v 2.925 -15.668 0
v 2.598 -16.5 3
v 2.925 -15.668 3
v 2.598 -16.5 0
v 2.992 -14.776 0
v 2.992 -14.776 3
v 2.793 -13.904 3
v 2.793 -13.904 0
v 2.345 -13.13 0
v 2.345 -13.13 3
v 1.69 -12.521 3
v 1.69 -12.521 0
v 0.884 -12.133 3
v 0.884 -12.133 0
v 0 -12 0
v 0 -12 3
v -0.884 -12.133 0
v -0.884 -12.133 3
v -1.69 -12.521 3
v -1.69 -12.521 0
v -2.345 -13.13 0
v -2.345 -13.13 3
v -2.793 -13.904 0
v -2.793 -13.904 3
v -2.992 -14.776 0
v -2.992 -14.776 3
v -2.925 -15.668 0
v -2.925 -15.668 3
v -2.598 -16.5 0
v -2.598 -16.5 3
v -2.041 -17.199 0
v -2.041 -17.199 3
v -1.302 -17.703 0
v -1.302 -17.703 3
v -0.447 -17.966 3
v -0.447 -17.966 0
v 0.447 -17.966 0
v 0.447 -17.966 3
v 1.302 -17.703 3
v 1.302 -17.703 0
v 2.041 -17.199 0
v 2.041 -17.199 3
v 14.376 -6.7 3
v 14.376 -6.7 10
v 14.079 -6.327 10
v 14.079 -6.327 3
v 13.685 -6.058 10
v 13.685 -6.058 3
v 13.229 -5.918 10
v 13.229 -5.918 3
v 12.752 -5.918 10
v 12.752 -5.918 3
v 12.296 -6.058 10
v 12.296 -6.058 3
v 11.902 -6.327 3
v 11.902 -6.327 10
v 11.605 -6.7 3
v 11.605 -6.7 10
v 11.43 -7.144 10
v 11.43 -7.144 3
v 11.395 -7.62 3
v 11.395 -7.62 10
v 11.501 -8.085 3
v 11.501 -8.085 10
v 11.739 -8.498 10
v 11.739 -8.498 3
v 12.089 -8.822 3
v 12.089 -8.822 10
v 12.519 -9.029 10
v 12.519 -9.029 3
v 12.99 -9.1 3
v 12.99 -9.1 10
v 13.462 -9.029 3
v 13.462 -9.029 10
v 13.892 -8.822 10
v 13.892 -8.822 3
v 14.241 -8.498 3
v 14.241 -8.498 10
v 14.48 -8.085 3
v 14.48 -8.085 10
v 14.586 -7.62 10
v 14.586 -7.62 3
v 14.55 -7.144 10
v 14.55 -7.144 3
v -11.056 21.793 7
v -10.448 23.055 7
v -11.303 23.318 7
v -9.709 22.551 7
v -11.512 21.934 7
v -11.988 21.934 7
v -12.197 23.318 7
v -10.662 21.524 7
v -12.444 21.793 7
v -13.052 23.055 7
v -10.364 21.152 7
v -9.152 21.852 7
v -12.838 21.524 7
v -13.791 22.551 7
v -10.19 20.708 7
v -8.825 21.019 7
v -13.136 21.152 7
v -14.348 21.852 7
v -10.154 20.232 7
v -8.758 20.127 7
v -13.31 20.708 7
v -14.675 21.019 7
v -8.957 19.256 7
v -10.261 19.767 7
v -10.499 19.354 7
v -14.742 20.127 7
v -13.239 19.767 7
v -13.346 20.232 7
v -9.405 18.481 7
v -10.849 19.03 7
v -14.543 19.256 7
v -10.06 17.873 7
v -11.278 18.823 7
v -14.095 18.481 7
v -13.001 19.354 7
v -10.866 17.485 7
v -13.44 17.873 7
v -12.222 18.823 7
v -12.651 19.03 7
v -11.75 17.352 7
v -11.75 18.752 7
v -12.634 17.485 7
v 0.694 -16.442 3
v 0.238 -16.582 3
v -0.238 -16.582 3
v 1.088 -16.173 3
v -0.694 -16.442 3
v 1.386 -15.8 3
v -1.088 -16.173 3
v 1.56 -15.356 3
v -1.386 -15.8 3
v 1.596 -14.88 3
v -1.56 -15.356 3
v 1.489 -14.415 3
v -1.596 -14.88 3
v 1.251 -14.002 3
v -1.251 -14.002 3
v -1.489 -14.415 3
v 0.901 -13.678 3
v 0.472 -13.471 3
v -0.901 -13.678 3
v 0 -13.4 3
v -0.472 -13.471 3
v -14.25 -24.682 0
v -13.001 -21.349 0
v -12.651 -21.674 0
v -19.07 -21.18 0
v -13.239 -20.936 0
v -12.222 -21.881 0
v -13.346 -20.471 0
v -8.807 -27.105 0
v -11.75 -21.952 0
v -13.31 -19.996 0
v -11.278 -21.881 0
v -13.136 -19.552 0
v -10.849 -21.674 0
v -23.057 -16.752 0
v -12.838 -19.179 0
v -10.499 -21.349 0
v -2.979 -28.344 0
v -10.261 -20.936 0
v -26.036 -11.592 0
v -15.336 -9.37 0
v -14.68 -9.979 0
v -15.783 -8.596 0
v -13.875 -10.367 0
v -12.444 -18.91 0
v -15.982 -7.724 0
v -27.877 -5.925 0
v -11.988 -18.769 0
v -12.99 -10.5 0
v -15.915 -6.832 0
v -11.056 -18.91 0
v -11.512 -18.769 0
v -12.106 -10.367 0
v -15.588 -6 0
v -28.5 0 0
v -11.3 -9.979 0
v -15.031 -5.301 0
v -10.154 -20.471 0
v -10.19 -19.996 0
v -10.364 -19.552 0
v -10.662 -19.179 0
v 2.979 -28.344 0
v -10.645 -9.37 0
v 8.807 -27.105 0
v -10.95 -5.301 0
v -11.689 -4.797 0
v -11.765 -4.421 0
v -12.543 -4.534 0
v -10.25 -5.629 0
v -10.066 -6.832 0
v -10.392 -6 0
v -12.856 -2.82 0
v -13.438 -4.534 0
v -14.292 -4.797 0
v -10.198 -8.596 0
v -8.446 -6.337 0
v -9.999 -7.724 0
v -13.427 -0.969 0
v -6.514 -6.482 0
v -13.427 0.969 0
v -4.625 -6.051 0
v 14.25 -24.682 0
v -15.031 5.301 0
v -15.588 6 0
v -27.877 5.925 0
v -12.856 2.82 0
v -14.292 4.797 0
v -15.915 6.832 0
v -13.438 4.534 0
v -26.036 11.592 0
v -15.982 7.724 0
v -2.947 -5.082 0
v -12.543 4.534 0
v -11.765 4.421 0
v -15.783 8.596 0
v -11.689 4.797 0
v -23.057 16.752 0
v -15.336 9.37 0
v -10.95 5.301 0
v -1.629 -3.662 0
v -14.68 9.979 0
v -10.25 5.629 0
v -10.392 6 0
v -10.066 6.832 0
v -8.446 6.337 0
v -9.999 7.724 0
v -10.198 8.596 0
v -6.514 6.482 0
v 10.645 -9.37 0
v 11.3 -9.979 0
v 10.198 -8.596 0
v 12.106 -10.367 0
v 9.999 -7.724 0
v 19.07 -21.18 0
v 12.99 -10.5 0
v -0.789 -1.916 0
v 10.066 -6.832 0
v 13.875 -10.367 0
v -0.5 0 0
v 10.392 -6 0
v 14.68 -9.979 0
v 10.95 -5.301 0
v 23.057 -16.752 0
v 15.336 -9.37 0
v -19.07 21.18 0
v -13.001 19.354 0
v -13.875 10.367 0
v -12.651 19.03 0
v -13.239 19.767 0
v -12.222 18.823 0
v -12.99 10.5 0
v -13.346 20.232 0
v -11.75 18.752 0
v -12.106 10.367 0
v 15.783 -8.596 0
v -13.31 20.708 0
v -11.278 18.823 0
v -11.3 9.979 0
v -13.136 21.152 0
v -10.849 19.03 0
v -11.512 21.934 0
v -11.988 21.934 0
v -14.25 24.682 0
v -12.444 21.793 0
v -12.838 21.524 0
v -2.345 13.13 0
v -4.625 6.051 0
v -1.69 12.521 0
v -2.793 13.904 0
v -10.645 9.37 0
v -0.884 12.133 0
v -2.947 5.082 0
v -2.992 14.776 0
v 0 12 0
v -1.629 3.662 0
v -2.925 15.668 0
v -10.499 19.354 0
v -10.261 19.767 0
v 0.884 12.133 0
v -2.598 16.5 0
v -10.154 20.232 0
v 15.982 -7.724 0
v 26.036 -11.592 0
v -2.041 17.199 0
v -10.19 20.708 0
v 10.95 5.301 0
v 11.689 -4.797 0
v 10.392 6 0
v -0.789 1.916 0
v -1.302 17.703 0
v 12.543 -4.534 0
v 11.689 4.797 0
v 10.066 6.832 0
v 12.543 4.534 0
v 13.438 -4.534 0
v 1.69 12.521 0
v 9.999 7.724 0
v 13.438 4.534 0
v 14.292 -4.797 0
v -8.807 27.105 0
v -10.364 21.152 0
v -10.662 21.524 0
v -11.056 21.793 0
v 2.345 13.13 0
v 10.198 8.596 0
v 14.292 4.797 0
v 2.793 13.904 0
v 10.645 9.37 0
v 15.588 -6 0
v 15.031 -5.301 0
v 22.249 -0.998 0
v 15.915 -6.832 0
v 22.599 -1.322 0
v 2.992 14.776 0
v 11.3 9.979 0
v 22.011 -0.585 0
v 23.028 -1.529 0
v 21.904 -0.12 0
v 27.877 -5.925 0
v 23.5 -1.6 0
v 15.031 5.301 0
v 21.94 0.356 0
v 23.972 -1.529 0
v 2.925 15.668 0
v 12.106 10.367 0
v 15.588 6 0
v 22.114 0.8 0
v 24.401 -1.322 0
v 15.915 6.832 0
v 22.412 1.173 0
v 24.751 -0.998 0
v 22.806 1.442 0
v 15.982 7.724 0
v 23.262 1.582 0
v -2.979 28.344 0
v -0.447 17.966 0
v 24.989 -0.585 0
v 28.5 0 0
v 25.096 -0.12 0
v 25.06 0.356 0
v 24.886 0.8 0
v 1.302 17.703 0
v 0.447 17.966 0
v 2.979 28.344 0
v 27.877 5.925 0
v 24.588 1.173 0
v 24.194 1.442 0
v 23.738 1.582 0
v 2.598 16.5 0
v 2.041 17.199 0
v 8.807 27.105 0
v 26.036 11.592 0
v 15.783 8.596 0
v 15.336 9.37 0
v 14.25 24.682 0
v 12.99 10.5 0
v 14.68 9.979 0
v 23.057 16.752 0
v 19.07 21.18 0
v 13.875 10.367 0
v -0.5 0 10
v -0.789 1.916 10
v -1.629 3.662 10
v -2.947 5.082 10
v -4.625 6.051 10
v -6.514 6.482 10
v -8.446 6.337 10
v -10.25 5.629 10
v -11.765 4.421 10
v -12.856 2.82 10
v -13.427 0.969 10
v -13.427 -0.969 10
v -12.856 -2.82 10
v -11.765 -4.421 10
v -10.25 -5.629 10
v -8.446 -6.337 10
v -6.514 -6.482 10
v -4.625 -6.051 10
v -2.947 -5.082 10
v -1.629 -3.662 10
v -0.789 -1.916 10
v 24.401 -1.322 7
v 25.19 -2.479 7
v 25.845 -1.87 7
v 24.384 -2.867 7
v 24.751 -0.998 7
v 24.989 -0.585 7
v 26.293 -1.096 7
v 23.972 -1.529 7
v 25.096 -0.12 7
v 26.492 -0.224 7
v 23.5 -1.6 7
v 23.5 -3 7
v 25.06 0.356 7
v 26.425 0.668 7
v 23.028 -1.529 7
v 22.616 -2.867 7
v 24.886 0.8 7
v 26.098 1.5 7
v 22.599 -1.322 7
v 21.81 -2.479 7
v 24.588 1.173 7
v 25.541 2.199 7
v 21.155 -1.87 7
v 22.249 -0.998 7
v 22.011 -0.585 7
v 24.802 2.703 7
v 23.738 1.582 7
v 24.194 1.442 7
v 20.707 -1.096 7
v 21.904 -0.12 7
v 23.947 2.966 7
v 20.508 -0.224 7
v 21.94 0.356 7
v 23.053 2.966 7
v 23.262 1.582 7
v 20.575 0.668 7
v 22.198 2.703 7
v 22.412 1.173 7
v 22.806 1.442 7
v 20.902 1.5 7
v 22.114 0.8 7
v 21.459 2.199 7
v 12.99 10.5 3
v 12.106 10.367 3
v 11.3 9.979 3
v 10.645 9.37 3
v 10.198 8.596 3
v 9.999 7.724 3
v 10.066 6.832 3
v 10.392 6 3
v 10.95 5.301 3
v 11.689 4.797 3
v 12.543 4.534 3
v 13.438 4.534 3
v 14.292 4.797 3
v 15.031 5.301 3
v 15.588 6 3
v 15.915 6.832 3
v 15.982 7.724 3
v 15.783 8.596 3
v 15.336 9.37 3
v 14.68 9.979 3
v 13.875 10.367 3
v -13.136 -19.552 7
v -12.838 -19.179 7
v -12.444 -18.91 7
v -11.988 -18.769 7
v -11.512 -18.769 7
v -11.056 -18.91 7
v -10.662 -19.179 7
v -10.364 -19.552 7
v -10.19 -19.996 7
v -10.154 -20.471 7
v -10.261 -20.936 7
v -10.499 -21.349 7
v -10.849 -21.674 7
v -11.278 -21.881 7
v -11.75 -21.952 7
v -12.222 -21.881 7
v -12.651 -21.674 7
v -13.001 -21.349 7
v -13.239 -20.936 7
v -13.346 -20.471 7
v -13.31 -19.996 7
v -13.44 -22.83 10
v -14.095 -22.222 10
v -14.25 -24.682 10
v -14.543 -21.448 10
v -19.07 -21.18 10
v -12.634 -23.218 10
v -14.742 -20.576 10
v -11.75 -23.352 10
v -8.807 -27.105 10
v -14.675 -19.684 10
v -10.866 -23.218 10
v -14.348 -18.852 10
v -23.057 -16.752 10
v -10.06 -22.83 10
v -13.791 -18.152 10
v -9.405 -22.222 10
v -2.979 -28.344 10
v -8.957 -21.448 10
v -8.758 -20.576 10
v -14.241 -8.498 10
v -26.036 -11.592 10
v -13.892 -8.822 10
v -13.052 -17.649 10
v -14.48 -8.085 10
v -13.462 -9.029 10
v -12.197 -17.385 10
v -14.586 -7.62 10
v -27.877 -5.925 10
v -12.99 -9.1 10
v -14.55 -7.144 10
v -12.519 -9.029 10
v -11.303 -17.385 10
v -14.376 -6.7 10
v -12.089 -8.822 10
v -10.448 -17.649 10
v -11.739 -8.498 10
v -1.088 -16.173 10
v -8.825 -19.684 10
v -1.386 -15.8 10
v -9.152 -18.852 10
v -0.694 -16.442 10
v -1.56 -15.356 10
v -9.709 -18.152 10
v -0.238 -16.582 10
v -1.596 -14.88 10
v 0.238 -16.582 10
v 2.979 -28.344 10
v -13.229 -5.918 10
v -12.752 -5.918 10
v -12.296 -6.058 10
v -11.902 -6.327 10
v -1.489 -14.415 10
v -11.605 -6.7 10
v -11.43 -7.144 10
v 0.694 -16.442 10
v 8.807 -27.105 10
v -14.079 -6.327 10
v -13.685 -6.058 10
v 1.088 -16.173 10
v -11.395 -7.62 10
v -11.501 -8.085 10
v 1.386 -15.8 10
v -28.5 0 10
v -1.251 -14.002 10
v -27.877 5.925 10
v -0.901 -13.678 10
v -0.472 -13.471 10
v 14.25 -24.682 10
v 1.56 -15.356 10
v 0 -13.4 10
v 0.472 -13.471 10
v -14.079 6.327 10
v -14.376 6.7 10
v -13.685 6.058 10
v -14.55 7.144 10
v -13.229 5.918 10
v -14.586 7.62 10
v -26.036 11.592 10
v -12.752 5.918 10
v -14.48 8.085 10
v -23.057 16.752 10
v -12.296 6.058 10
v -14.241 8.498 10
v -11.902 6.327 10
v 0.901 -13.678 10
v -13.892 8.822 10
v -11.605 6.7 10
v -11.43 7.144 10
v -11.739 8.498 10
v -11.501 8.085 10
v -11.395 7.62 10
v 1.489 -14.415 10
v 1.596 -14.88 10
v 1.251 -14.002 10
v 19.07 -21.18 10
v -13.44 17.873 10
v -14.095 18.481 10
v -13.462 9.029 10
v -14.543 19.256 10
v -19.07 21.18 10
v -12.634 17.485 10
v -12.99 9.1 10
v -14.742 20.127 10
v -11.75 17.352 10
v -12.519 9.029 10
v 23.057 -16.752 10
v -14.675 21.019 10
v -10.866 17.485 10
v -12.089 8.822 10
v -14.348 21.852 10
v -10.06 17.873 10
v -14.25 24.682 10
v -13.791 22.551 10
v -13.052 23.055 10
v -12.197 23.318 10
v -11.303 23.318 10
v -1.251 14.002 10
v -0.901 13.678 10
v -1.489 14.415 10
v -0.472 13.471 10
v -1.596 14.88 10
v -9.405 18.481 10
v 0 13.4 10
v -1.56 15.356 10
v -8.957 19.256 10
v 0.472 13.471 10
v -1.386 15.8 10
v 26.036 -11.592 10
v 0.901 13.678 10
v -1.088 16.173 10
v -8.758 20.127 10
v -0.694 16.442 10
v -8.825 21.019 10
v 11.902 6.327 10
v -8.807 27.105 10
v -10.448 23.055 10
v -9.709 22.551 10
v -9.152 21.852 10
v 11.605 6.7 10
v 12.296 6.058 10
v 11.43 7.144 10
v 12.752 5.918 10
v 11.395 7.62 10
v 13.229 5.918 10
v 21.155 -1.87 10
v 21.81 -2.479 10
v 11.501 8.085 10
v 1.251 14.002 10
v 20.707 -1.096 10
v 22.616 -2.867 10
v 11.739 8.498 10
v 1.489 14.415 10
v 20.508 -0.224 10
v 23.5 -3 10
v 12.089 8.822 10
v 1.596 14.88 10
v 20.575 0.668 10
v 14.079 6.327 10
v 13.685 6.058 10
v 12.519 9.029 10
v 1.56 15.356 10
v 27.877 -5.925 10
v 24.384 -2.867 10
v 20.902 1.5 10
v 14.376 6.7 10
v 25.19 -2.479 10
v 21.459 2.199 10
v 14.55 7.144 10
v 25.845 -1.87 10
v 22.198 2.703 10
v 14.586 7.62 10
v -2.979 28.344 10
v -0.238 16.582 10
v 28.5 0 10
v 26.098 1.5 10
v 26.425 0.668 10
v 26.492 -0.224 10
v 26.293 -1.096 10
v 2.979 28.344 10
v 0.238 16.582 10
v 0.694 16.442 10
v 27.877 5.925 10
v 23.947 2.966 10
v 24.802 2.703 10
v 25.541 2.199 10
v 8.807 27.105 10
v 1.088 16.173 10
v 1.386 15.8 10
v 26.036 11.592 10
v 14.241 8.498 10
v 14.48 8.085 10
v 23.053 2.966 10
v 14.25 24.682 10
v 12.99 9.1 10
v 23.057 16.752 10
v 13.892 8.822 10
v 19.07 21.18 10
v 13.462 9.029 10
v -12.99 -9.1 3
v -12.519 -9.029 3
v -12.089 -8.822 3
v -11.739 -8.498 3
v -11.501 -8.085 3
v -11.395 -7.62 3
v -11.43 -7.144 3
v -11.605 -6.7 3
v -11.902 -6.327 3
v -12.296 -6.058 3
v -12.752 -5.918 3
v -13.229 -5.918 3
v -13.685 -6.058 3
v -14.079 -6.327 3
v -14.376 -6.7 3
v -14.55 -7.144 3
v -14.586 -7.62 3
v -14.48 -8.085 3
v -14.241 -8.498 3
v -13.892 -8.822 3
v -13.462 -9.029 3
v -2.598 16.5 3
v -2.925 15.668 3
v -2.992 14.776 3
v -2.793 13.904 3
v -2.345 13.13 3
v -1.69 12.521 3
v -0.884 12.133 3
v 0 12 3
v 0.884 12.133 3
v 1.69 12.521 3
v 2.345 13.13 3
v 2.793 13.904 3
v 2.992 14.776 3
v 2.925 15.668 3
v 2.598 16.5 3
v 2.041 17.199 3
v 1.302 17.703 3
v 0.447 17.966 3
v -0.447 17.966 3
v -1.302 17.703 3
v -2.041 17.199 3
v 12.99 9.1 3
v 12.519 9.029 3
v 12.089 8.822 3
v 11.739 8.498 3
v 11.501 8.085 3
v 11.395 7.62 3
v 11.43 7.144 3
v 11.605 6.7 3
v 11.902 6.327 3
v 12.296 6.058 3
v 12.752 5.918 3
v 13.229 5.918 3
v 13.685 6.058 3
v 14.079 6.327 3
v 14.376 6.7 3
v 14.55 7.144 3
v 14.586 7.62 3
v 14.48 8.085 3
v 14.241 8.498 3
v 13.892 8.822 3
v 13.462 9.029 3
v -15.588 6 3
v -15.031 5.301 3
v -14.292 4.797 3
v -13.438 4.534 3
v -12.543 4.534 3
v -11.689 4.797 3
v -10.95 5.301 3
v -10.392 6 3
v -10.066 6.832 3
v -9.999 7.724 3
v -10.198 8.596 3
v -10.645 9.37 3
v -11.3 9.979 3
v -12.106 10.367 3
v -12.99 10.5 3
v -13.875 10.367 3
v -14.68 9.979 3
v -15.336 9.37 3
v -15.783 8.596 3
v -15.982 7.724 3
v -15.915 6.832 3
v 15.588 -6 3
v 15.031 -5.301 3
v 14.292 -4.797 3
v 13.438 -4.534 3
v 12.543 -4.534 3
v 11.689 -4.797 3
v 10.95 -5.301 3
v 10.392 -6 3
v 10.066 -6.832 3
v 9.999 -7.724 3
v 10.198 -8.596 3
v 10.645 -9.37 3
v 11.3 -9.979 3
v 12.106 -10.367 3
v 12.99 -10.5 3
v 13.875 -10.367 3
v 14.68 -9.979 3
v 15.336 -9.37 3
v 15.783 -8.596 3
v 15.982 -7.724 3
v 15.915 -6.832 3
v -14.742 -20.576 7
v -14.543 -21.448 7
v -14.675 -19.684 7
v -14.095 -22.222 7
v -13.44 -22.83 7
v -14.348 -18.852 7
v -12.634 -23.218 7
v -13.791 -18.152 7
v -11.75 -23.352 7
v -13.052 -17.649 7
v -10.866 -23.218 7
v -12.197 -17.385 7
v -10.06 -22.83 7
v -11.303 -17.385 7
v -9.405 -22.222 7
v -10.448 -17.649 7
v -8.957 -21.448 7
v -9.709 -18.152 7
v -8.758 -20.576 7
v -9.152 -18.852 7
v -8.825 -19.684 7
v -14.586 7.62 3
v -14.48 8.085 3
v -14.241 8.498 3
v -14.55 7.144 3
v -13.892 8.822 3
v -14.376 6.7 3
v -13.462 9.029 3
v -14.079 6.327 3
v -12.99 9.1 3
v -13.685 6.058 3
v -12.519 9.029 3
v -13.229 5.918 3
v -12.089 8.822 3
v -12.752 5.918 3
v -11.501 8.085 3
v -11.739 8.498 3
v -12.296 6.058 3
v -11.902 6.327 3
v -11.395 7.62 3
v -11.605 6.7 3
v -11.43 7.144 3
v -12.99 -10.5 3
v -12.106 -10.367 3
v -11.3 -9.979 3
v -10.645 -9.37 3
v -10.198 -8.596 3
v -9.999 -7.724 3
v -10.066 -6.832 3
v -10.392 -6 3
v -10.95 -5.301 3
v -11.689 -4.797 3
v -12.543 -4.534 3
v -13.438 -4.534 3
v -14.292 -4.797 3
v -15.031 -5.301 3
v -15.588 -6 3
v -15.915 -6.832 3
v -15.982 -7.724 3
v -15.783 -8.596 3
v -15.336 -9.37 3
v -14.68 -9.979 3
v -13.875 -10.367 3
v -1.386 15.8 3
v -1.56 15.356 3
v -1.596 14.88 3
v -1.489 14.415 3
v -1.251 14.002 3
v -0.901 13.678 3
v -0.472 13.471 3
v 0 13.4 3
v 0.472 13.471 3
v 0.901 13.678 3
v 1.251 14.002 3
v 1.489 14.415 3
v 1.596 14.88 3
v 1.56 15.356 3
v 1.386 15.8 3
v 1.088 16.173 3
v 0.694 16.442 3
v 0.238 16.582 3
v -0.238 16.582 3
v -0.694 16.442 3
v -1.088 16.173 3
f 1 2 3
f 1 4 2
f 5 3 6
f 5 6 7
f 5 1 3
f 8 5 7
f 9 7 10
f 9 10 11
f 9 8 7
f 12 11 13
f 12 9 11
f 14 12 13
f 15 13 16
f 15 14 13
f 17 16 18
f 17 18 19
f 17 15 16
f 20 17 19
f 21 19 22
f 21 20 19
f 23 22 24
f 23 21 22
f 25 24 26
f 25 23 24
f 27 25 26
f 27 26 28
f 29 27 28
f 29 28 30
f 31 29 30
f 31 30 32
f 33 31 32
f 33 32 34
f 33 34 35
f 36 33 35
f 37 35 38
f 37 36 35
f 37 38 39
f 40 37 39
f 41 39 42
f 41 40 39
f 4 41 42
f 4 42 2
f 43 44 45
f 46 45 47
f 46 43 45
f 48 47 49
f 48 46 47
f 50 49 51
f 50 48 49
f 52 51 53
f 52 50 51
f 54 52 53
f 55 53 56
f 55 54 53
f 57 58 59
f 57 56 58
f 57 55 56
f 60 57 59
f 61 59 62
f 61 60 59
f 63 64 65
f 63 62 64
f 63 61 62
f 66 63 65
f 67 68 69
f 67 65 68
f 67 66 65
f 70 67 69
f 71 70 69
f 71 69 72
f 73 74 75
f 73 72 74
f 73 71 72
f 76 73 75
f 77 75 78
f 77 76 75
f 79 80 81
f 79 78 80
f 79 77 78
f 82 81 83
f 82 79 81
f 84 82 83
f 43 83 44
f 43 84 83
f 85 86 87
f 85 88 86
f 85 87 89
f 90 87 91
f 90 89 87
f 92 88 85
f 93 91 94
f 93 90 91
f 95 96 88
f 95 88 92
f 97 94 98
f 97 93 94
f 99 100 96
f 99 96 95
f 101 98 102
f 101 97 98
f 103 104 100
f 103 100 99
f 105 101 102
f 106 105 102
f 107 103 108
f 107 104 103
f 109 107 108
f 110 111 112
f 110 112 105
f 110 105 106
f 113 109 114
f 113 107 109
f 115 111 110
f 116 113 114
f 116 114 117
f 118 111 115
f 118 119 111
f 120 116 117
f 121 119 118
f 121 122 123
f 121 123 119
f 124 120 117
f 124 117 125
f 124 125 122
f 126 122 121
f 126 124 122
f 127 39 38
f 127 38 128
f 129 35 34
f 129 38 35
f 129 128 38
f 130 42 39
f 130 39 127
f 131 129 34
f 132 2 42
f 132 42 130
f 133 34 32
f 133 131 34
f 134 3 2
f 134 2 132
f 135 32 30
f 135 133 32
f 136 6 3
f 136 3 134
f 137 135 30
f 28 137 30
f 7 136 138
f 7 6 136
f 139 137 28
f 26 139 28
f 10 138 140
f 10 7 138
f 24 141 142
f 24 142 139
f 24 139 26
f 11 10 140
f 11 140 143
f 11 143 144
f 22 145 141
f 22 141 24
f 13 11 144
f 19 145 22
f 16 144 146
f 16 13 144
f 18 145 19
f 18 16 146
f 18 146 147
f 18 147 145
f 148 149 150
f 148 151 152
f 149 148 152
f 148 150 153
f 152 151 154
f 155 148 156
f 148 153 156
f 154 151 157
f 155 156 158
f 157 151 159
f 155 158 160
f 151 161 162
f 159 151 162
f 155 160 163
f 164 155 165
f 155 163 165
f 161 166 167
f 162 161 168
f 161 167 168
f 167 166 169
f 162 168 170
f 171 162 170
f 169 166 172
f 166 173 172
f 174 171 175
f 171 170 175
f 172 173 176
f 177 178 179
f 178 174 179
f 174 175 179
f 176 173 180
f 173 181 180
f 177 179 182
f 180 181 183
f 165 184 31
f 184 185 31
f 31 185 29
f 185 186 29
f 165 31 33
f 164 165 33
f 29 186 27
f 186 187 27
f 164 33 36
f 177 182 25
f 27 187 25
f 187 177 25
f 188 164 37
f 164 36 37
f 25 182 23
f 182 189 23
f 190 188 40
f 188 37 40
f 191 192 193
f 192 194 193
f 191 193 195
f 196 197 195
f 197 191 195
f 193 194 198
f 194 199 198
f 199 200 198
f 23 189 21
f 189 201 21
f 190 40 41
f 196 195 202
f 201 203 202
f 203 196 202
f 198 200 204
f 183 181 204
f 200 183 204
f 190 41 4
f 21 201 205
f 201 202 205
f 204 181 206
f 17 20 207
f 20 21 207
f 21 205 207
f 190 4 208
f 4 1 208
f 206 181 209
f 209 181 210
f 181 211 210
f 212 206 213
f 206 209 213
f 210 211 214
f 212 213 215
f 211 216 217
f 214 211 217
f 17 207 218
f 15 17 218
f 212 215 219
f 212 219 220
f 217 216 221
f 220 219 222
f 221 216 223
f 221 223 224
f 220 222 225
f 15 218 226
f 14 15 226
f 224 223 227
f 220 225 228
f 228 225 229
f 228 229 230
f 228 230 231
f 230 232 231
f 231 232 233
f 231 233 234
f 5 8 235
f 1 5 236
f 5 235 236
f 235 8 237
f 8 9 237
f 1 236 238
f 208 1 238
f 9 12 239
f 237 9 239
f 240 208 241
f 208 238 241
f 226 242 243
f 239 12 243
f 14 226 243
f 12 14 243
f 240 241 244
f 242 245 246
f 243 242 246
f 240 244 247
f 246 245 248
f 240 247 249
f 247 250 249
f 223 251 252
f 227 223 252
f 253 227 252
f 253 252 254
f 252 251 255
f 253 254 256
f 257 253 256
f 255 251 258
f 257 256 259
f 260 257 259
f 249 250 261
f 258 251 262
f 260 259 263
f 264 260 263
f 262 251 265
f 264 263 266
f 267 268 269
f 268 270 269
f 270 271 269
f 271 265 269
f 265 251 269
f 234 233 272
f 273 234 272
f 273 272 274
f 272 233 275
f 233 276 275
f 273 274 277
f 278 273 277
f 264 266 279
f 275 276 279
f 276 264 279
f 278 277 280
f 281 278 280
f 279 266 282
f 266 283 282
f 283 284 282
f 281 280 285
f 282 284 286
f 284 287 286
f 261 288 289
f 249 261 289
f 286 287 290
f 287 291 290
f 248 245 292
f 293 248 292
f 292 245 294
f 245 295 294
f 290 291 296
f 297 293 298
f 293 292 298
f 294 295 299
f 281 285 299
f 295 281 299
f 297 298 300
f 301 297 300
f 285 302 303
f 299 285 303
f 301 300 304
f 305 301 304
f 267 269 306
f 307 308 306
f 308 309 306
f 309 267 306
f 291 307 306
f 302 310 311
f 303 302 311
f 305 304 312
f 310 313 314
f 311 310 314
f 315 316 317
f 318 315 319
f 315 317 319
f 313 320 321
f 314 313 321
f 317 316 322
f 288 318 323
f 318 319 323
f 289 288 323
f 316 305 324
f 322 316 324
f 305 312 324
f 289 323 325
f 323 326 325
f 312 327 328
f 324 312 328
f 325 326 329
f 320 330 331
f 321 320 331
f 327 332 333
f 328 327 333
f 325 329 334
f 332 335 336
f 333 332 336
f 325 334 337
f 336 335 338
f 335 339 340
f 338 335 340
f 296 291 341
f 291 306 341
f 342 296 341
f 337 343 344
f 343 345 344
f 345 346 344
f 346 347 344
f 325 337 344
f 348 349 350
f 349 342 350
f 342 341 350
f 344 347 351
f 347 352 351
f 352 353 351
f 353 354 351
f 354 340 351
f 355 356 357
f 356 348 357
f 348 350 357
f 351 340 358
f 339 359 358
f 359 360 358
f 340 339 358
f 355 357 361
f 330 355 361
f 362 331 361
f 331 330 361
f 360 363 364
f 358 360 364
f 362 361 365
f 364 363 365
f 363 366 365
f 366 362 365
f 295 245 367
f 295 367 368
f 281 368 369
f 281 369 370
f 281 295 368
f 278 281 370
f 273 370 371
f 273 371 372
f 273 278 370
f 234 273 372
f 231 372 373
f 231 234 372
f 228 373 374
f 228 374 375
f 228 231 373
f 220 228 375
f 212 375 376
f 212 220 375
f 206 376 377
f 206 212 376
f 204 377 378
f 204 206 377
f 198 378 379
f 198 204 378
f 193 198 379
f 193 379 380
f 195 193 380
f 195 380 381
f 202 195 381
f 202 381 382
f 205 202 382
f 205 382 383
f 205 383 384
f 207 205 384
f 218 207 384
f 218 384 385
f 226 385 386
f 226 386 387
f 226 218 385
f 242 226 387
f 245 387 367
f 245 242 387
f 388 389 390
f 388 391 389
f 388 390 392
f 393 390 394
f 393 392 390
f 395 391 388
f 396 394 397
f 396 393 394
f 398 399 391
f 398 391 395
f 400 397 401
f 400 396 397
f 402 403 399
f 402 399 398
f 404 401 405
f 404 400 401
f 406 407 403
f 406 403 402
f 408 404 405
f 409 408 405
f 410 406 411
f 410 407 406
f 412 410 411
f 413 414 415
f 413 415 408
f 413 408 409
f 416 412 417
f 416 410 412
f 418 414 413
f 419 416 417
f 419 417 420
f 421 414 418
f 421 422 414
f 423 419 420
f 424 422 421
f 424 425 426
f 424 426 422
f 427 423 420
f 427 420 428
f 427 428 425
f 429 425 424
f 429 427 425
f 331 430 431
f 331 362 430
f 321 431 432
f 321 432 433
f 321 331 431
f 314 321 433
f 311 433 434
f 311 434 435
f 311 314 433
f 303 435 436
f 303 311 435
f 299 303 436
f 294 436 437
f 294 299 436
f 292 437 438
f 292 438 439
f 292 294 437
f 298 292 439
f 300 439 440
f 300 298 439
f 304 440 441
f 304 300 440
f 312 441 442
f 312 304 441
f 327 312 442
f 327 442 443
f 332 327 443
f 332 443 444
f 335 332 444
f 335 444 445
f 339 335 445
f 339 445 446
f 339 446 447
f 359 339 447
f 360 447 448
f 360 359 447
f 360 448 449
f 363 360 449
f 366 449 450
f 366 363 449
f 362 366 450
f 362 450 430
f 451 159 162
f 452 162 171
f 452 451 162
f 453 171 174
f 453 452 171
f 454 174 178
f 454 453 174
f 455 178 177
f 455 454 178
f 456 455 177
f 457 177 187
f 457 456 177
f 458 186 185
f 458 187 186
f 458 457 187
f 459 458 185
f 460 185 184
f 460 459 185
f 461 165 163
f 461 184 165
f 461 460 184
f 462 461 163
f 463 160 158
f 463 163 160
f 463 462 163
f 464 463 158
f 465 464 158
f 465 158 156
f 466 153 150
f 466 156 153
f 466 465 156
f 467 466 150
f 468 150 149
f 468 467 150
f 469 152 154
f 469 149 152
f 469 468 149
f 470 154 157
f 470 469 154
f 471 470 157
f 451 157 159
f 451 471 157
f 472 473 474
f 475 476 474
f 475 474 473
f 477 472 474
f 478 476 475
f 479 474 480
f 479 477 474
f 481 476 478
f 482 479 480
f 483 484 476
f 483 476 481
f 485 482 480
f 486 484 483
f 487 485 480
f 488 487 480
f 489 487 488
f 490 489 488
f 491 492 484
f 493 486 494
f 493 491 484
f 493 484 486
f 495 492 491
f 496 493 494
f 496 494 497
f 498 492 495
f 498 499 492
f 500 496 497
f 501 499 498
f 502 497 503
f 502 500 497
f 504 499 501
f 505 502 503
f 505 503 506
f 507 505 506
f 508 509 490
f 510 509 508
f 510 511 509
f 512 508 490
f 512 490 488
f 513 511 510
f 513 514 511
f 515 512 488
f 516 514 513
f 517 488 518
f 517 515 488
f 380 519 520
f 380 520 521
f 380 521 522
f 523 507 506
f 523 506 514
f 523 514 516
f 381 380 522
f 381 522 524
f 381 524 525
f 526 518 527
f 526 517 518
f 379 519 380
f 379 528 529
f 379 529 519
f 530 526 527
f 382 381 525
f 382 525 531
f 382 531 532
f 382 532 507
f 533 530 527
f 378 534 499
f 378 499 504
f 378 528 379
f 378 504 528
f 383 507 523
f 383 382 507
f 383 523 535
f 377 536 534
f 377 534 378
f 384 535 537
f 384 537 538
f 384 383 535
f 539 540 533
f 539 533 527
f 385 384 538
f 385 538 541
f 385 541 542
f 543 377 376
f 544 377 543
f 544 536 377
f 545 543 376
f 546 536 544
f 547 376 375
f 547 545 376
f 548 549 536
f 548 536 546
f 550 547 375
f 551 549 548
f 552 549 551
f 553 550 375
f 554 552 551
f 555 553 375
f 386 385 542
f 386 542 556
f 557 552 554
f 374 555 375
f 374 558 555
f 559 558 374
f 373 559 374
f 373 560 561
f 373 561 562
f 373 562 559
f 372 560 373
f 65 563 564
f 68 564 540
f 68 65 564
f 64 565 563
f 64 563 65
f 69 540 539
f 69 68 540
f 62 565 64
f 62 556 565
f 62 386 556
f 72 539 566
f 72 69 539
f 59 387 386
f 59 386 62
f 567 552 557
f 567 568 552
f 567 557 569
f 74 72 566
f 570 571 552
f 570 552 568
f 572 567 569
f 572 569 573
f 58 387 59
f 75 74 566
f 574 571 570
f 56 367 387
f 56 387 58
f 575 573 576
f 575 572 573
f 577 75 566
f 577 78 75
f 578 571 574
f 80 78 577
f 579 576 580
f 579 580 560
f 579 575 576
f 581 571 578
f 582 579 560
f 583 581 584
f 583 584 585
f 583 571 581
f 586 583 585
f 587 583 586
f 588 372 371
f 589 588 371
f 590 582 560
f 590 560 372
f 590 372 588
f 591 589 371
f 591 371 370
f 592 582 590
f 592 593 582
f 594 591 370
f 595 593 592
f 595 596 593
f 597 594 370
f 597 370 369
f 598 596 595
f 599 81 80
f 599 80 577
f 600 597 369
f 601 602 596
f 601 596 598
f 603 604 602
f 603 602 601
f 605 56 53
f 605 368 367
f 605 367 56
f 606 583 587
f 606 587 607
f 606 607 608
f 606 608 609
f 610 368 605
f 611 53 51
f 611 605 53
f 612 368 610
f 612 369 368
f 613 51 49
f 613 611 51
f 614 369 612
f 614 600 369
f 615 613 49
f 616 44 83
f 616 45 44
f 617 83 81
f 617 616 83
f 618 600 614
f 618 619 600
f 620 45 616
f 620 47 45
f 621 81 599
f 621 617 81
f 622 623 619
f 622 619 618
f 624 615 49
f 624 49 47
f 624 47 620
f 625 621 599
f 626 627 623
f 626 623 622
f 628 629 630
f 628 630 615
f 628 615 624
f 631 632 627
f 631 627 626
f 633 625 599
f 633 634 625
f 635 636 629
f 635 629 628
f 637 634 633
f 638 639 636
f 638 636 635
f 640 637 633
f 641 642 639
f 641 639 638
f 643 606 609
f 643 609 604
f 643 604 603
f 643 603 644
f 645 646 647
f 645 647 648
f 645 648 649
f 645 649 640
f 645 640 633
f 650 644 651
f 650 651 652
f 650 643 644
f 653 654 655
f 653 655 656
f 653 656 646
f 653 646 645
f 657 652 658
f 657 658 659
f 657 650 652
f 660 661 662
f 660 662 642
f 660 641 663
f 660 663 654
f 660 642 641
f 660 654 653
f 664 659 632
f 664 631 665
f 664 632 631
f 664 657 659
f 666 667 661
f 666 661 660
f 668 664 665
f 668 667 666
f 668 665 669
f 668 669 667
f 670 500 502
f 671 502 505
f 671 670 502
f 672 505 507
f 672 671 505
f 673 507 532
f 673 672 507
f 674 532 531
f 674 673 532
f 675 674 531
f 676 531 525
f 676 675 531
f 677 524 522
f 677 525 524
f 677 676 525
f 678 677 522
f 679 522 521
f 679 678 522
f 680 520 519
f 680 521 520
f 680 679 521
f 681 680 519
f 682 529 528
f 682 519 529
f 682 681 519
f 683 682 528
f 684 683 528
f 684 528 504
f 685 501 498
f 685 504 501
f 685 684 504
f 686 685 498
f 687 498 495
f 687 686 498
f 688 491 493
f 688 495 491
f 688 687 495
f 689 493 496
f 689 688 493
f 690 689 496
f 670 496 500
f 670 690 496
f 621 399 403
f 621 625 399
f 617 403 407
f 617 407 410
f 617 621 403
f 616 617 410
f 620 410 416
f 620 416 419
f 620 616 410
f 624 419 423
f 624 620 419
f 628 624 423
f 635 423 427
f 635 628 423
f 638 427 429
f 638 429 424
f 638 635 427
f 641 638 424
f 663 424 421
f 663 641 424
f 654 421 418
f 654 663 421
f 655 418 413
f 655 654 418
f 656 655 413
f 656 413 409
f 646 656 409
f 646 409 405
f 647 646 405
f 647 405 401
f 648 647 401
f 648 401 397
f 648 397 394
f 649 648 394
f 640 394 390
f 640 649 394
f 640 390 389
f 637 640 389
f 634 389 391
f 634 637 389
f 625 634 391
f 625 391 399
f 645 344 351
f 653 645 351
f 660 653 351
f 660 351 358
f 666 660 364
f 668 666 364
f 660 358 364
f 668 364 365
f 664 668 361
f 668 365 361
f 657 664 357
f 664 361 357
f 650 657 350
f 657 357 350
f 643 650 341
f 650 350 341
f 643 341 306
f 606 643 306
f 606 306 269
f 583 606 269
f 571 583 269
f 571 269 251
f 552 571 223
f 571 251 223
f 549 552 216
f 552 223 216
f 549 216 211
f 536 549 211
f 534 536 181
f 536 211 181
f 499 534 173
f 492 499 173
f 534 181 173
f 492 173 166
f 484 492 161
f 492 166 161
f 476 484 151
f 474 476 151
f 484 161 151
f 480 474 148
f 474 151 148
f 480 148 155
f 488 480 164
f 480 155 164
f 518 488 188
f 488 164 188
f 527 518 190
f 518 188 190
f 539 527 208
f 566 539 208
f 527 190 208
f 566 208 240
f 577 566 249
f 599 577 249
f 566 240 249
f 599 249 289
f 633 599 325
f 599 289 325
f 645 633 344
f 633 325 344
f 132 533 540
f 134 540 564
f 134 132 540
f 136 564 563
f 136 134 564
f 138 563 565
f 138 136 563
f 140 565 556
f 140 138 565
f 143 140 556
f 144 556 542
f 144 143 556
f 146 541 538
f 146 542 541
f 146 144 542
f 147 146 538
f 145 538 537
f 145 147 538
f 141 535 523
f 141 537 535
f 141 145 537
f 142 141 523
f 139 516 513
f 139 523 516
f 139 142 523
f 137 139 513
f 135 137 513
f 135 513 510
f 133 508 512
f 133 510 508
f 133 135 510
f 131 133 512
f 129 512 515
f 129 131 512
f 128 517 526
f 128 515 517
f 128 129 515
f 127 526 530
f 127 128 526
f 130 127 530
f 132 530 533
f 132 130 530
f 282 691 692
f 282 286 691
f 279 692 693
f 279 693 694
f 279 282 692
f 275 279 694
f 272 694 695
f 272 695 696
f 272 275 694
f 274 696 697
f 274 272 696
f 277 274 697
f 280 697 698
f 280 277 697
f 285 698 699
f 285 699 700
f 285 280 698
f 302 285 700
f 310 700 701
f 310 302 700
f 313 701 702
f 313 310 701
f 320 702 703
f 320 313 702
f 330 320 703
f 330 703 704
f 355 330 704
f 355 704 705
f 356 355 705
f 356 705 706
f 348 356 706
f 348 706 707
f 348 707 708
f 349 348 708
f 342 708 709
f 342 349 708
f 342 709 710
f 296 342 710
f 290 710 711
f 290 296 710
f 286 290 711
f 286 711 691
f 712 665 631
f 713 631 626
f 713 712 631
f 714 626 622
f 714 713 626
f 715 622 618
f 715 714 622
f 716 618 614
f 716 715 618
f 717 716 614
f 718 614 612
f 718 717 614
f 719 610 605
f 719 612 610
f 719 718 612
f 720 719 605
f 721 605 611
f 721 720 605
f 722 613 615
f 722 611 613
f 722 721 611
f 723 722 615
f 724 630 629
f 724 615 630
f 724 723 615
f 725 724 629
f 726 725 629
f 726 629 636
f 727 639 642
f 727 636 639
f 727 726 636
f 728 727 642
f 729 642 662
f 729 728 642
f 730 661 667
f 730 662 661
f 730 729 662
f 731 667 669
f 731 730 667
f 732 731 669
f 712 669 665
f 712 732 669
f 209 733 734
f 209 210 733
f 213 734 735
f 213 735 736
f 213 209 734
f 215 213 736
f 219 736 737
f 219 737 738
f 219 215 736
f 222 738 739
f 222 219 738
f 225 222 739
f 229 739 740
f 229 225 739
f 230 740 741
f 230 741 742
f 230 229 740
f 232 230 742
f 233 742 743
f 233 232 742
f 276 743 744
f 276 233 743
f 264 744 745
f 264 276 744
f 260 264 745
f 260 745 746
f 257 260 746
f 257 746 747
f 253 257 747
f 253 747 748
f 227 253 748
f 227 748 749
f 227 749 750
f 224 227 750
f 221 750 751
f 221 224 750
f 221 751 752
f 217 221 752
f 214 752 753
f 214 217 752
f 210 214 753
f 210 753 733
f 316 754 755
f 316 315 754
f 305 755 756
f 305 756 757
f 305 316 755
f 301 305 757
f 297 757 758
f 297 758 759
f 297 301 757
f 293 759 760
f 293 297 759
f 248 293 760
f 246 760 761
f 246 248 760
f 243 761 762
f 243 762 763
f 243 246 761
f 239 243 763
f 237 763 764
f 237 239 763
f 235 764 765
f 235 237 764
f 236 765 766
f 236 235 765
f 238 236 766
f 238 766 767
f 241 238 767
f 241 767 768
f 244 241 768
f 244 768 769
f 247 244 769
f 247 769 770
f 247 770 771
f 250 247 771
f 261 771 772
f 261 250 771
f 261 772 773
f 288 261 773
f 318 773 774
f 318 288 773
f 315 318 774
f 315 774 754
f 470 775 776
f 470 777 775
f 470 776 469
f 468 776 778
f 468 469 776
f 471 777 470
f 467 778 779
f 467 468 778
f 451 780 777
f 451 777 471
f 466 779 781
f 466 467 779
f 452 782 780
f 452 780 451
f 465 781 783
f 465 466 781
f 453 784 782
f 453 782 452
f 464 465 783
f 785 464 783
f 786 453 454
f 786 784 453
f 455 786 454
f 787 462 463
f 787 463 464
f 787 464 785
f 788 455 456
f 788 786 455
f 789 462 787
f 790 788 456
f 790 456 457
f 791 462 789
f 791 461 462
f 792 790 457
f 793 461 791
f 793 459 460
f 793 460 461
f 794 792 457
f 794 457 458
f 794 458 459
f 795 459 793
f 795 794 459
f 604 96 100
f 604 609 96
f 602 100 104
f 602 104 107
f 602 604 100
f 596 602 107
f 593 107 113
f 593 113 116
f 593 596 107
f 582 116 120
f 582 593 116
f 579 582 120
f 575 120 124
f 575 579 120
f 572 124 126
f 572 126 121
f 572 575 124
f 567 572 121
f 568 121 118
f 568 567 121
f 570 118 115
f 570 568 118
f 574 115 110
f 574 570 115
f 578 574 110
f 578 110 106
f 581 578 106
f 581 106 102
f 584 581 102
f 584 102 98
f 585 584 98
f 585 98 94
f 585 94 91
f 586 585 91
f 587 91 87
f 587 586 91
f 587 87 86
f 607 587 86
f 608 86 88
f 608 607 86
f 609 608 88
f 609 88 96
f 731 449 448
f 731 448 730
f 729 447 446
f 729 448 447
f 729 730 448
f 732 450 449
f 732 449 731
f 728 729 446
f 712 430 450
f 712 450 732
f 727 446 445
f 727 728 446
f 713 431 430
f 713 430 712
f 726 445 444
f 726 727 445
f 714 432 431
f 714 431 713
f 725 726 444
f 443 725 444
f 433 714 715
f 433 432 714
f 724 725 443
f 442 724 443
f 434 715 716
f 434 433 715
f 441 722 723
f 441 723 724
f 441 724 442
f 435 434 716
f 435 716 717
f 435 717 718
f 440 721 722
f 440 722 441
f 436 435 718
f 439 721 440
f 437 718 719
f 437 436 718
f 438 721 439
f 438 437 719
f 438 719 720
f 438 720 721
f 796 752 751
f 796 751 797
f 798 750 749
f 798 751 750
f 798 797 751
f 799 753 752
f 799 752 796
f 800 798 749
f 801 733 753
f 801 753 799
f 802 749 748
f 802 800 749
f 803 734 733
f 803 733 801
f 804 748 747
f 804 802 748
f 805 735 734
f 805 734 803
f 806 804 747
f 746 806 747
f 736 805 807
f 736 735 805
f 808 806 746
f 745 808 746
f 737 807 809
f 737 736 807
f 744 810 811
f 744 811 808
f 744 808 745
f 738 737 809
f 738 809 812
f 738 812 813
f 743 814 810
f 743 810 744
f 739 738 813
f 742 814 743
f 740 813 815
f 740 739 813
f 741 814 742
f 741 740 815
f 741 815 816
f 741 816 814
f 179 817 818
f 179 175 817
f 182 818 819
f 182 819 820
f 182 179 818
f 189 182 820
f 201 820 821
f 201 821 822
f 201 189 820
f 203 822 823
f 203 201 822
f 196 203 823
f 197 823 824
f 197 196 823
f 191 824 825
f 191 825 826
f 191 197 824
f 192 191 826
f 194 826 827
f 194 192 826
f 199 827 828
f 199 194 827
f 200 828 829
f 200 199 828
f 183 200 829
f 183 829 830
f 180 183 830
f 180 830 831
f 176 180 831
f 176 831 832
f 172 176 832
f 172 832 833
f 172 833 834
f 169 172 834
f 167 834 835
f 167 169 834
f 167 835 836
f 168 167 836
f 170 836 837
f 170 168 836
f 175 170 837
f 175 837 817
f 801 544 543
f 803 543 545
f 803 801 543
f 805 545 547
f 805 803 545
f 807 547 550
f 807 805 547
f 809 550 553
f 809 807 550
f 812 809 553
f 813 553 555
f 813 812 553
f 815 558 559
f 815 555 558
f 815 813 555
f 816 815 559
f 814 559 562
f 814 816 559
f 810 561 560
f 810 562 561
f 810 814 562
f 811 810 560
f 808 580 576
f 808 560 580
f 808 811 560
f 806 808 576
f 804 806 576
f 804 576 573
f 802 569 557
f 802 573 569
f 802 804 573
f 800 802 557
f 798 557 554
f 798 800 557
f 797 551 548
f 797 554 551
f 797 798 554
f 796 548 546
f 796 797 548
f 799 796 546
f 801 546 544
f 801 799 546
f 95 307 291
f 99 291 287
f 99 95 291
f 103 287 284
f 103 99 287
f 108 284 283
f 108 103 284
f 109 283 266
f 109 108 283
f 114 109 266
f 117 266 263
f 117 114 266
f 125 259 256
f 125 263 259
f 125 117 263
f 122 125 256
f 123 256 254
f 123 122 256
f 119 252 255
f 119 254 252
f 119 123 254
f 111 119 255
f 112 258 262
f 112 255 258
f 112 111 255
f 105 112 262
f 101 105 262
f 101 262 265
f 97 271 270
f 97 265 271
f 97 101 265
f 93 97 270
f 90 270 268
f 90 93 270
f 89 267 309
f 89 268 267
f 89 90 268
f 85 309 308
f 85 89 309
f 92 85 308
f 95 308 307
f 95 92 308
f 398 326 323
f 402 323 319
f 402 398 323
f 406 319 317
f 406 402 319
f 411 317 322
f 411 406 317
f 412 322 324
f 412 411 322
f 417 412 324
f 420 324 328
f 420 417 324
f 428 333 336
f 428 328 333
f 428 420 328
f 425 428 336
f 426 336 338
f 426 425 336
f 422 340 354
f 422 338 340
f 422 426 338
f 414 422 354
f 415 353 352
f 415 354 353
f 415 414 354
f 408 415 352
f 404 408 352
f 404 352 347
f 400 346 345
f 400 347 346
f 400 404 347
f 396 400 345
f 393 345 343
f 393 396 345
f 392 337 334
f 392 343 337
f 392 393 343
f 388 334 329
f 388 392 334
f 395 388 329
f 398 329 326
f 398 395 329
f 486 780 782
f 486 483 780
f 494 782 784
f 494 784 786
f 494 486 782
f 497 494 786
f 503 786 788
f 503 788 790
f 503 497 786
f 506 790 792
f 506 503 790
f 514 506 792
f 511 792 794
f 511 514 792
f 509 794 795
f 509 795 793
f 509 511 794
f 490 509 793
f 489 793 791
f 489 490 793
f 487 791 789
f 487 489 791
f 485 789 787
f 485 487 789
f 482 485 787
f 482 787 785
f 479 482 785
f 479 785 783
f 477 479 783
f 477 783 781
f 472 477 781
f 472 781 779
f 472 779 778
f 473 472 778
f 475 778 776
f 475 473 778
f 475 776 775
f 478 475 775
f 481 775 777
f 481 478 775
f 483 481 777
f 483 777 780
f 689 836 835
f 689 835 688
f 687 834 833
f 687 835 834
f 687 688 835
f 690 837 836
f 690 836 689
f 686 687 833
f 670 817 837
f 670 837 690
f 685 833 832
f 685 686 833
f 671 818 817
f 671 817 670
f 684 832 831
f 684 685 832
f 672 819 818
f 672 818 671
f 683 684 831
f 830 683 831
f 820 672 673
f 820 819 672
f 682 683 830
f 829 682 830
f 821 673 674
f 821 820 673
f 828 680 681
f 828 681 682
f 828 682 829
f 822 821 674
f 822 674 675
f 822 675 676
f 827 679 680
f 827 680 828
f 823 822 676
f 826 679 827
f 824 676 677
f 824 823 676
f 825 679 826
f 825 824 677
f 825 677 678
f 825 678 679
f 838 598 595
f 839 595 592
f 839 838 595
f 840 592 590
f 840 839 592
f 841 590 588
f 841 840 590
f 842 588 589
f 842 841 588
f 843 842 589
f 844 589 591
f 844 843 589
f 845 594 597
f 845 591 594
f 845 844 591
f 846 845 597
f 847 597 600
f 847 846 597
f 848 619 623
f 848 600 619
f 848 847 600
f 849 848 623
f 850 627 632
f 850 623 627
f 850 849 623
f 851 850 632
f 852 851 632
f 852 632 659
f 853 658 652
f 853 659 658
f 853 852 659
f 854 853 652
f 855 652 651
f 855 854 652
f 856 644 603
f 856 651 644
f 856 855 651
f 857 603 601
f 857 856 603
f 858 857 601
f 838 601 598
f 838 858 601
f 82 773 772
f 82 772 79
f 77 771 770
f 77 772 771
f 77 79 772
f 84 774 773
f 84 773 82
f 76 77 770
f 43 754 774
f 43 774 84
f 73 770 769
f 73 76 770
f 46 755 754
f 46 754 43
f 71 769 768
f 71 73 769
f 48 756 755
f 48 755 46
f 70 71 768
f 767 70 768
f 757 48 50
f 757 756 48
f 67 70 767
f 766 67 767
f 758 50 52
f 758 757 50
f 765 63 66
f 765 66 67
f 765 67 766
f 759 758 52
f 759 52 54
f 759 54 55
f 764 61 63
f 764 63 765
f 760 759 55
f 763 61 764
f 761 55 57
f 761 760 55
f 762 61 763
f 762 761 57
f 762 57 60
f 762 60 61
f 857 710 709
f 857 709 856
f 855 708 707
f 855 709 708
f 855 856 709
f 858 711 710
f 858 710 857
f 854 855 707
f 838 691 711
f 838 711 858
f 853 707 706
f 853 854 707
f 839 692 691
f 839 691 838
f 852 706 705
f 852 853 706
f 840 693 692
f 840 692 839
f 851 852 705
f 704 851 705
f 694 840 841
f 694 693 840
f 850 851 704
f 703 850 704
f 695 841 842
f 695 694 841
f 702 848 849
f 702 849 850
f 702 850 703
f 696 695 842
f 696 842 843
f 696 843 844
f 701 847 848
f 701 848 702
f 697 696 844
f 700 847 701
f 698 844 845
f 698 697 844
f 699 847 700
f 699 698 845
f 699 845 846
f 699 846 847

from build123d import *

# Parameters (mm, degrees)
CROQUIS1_R              = 28.5
CROQUIS1_R_2            = 6.5
SALIENTE_EXTRUIR1_DEPTH = 10
MATRIZC2_COUNT          = 3
MATRIZC3_COUNT          = 6


with BuildPart() as part:
    # Croquis1 → Saliente-Extruir1 (new body)
    with BuildSketch(Plane.XY):
        Circle(CROQUIS1_R)
        with Locations((-7, 0)):
            Circle(CROQUIS1_R_2, mode=Mode.SUBTRACT)
    extrude(amount=SALIENTE_EXTRUIR1_DEPTH)

    # Croquis4 → Refrentado para tornillo con cabeza tron (revolve, cut)
    with BuildSketch(Plane(origin=(23.5, 0, 10), x_dir=(0, -1, 0), z_dir=(1, 0, 0))):
        Polygon((0, 0), (0, 20.96137699), (1.6, 20), (1.6, 3), (3, 3), (3, 0), align=None)
    refrentado_para_tornillo_con_cabeza_tron = revolve(axis=Axis((23.5, 0, 16.35), (0, 0, -1)), mode=Mode.SUBTRACT)

    # MatrizC2: Refrentado para tornillo con cabeza tron ×3 about axis
    matrizc2_axis = Axis((0, 0, 0), (0, 0, 1))
    for i in range(1, MATRIZC2_COUNT):
        add(refrentado_para_tornillo_con_cabeza_tron.rotate(matrizc2_axis, i * 360 / MATRIZC2_COUNT), mode=Mode.SUBTRACT)

    # Croquis9 → Refrentado para tornillo con cabeza  2 (revolve, cut)
    with BuildSketch(Plane(origin=(12.990381057, 7.5, 0), x_dir=(0, 1, 0), z_dir=(1, 0, 0))):
        Polygon((0, 0), (0, 20.96137699), (1.6, 20), (1.6, 3), (3, 3), (3, 0), align=None)
    refrentado_para_tornillo_con_cabeza_2 = revolve(axis=Axis((12.990381057, 7.5, -6.35), (0, 0, 1)), mode=Mode.SUBTRACT)

    # MatrizC3: Refrentado para tornillo con cabeza  2 ×6 about axis
    matrizc3_axis = Axis((0, 0, 0), (0, 0, 1))
    for i in range(1, MATRIZC3_COUNT):
        add(refrentado_para_tornillo_con_cabeza_2.rotate(matrizc3_axis, i * 360 / MATRIZC3_COUNT), mode=Mode.SUBTRACT)


solid = part.part
